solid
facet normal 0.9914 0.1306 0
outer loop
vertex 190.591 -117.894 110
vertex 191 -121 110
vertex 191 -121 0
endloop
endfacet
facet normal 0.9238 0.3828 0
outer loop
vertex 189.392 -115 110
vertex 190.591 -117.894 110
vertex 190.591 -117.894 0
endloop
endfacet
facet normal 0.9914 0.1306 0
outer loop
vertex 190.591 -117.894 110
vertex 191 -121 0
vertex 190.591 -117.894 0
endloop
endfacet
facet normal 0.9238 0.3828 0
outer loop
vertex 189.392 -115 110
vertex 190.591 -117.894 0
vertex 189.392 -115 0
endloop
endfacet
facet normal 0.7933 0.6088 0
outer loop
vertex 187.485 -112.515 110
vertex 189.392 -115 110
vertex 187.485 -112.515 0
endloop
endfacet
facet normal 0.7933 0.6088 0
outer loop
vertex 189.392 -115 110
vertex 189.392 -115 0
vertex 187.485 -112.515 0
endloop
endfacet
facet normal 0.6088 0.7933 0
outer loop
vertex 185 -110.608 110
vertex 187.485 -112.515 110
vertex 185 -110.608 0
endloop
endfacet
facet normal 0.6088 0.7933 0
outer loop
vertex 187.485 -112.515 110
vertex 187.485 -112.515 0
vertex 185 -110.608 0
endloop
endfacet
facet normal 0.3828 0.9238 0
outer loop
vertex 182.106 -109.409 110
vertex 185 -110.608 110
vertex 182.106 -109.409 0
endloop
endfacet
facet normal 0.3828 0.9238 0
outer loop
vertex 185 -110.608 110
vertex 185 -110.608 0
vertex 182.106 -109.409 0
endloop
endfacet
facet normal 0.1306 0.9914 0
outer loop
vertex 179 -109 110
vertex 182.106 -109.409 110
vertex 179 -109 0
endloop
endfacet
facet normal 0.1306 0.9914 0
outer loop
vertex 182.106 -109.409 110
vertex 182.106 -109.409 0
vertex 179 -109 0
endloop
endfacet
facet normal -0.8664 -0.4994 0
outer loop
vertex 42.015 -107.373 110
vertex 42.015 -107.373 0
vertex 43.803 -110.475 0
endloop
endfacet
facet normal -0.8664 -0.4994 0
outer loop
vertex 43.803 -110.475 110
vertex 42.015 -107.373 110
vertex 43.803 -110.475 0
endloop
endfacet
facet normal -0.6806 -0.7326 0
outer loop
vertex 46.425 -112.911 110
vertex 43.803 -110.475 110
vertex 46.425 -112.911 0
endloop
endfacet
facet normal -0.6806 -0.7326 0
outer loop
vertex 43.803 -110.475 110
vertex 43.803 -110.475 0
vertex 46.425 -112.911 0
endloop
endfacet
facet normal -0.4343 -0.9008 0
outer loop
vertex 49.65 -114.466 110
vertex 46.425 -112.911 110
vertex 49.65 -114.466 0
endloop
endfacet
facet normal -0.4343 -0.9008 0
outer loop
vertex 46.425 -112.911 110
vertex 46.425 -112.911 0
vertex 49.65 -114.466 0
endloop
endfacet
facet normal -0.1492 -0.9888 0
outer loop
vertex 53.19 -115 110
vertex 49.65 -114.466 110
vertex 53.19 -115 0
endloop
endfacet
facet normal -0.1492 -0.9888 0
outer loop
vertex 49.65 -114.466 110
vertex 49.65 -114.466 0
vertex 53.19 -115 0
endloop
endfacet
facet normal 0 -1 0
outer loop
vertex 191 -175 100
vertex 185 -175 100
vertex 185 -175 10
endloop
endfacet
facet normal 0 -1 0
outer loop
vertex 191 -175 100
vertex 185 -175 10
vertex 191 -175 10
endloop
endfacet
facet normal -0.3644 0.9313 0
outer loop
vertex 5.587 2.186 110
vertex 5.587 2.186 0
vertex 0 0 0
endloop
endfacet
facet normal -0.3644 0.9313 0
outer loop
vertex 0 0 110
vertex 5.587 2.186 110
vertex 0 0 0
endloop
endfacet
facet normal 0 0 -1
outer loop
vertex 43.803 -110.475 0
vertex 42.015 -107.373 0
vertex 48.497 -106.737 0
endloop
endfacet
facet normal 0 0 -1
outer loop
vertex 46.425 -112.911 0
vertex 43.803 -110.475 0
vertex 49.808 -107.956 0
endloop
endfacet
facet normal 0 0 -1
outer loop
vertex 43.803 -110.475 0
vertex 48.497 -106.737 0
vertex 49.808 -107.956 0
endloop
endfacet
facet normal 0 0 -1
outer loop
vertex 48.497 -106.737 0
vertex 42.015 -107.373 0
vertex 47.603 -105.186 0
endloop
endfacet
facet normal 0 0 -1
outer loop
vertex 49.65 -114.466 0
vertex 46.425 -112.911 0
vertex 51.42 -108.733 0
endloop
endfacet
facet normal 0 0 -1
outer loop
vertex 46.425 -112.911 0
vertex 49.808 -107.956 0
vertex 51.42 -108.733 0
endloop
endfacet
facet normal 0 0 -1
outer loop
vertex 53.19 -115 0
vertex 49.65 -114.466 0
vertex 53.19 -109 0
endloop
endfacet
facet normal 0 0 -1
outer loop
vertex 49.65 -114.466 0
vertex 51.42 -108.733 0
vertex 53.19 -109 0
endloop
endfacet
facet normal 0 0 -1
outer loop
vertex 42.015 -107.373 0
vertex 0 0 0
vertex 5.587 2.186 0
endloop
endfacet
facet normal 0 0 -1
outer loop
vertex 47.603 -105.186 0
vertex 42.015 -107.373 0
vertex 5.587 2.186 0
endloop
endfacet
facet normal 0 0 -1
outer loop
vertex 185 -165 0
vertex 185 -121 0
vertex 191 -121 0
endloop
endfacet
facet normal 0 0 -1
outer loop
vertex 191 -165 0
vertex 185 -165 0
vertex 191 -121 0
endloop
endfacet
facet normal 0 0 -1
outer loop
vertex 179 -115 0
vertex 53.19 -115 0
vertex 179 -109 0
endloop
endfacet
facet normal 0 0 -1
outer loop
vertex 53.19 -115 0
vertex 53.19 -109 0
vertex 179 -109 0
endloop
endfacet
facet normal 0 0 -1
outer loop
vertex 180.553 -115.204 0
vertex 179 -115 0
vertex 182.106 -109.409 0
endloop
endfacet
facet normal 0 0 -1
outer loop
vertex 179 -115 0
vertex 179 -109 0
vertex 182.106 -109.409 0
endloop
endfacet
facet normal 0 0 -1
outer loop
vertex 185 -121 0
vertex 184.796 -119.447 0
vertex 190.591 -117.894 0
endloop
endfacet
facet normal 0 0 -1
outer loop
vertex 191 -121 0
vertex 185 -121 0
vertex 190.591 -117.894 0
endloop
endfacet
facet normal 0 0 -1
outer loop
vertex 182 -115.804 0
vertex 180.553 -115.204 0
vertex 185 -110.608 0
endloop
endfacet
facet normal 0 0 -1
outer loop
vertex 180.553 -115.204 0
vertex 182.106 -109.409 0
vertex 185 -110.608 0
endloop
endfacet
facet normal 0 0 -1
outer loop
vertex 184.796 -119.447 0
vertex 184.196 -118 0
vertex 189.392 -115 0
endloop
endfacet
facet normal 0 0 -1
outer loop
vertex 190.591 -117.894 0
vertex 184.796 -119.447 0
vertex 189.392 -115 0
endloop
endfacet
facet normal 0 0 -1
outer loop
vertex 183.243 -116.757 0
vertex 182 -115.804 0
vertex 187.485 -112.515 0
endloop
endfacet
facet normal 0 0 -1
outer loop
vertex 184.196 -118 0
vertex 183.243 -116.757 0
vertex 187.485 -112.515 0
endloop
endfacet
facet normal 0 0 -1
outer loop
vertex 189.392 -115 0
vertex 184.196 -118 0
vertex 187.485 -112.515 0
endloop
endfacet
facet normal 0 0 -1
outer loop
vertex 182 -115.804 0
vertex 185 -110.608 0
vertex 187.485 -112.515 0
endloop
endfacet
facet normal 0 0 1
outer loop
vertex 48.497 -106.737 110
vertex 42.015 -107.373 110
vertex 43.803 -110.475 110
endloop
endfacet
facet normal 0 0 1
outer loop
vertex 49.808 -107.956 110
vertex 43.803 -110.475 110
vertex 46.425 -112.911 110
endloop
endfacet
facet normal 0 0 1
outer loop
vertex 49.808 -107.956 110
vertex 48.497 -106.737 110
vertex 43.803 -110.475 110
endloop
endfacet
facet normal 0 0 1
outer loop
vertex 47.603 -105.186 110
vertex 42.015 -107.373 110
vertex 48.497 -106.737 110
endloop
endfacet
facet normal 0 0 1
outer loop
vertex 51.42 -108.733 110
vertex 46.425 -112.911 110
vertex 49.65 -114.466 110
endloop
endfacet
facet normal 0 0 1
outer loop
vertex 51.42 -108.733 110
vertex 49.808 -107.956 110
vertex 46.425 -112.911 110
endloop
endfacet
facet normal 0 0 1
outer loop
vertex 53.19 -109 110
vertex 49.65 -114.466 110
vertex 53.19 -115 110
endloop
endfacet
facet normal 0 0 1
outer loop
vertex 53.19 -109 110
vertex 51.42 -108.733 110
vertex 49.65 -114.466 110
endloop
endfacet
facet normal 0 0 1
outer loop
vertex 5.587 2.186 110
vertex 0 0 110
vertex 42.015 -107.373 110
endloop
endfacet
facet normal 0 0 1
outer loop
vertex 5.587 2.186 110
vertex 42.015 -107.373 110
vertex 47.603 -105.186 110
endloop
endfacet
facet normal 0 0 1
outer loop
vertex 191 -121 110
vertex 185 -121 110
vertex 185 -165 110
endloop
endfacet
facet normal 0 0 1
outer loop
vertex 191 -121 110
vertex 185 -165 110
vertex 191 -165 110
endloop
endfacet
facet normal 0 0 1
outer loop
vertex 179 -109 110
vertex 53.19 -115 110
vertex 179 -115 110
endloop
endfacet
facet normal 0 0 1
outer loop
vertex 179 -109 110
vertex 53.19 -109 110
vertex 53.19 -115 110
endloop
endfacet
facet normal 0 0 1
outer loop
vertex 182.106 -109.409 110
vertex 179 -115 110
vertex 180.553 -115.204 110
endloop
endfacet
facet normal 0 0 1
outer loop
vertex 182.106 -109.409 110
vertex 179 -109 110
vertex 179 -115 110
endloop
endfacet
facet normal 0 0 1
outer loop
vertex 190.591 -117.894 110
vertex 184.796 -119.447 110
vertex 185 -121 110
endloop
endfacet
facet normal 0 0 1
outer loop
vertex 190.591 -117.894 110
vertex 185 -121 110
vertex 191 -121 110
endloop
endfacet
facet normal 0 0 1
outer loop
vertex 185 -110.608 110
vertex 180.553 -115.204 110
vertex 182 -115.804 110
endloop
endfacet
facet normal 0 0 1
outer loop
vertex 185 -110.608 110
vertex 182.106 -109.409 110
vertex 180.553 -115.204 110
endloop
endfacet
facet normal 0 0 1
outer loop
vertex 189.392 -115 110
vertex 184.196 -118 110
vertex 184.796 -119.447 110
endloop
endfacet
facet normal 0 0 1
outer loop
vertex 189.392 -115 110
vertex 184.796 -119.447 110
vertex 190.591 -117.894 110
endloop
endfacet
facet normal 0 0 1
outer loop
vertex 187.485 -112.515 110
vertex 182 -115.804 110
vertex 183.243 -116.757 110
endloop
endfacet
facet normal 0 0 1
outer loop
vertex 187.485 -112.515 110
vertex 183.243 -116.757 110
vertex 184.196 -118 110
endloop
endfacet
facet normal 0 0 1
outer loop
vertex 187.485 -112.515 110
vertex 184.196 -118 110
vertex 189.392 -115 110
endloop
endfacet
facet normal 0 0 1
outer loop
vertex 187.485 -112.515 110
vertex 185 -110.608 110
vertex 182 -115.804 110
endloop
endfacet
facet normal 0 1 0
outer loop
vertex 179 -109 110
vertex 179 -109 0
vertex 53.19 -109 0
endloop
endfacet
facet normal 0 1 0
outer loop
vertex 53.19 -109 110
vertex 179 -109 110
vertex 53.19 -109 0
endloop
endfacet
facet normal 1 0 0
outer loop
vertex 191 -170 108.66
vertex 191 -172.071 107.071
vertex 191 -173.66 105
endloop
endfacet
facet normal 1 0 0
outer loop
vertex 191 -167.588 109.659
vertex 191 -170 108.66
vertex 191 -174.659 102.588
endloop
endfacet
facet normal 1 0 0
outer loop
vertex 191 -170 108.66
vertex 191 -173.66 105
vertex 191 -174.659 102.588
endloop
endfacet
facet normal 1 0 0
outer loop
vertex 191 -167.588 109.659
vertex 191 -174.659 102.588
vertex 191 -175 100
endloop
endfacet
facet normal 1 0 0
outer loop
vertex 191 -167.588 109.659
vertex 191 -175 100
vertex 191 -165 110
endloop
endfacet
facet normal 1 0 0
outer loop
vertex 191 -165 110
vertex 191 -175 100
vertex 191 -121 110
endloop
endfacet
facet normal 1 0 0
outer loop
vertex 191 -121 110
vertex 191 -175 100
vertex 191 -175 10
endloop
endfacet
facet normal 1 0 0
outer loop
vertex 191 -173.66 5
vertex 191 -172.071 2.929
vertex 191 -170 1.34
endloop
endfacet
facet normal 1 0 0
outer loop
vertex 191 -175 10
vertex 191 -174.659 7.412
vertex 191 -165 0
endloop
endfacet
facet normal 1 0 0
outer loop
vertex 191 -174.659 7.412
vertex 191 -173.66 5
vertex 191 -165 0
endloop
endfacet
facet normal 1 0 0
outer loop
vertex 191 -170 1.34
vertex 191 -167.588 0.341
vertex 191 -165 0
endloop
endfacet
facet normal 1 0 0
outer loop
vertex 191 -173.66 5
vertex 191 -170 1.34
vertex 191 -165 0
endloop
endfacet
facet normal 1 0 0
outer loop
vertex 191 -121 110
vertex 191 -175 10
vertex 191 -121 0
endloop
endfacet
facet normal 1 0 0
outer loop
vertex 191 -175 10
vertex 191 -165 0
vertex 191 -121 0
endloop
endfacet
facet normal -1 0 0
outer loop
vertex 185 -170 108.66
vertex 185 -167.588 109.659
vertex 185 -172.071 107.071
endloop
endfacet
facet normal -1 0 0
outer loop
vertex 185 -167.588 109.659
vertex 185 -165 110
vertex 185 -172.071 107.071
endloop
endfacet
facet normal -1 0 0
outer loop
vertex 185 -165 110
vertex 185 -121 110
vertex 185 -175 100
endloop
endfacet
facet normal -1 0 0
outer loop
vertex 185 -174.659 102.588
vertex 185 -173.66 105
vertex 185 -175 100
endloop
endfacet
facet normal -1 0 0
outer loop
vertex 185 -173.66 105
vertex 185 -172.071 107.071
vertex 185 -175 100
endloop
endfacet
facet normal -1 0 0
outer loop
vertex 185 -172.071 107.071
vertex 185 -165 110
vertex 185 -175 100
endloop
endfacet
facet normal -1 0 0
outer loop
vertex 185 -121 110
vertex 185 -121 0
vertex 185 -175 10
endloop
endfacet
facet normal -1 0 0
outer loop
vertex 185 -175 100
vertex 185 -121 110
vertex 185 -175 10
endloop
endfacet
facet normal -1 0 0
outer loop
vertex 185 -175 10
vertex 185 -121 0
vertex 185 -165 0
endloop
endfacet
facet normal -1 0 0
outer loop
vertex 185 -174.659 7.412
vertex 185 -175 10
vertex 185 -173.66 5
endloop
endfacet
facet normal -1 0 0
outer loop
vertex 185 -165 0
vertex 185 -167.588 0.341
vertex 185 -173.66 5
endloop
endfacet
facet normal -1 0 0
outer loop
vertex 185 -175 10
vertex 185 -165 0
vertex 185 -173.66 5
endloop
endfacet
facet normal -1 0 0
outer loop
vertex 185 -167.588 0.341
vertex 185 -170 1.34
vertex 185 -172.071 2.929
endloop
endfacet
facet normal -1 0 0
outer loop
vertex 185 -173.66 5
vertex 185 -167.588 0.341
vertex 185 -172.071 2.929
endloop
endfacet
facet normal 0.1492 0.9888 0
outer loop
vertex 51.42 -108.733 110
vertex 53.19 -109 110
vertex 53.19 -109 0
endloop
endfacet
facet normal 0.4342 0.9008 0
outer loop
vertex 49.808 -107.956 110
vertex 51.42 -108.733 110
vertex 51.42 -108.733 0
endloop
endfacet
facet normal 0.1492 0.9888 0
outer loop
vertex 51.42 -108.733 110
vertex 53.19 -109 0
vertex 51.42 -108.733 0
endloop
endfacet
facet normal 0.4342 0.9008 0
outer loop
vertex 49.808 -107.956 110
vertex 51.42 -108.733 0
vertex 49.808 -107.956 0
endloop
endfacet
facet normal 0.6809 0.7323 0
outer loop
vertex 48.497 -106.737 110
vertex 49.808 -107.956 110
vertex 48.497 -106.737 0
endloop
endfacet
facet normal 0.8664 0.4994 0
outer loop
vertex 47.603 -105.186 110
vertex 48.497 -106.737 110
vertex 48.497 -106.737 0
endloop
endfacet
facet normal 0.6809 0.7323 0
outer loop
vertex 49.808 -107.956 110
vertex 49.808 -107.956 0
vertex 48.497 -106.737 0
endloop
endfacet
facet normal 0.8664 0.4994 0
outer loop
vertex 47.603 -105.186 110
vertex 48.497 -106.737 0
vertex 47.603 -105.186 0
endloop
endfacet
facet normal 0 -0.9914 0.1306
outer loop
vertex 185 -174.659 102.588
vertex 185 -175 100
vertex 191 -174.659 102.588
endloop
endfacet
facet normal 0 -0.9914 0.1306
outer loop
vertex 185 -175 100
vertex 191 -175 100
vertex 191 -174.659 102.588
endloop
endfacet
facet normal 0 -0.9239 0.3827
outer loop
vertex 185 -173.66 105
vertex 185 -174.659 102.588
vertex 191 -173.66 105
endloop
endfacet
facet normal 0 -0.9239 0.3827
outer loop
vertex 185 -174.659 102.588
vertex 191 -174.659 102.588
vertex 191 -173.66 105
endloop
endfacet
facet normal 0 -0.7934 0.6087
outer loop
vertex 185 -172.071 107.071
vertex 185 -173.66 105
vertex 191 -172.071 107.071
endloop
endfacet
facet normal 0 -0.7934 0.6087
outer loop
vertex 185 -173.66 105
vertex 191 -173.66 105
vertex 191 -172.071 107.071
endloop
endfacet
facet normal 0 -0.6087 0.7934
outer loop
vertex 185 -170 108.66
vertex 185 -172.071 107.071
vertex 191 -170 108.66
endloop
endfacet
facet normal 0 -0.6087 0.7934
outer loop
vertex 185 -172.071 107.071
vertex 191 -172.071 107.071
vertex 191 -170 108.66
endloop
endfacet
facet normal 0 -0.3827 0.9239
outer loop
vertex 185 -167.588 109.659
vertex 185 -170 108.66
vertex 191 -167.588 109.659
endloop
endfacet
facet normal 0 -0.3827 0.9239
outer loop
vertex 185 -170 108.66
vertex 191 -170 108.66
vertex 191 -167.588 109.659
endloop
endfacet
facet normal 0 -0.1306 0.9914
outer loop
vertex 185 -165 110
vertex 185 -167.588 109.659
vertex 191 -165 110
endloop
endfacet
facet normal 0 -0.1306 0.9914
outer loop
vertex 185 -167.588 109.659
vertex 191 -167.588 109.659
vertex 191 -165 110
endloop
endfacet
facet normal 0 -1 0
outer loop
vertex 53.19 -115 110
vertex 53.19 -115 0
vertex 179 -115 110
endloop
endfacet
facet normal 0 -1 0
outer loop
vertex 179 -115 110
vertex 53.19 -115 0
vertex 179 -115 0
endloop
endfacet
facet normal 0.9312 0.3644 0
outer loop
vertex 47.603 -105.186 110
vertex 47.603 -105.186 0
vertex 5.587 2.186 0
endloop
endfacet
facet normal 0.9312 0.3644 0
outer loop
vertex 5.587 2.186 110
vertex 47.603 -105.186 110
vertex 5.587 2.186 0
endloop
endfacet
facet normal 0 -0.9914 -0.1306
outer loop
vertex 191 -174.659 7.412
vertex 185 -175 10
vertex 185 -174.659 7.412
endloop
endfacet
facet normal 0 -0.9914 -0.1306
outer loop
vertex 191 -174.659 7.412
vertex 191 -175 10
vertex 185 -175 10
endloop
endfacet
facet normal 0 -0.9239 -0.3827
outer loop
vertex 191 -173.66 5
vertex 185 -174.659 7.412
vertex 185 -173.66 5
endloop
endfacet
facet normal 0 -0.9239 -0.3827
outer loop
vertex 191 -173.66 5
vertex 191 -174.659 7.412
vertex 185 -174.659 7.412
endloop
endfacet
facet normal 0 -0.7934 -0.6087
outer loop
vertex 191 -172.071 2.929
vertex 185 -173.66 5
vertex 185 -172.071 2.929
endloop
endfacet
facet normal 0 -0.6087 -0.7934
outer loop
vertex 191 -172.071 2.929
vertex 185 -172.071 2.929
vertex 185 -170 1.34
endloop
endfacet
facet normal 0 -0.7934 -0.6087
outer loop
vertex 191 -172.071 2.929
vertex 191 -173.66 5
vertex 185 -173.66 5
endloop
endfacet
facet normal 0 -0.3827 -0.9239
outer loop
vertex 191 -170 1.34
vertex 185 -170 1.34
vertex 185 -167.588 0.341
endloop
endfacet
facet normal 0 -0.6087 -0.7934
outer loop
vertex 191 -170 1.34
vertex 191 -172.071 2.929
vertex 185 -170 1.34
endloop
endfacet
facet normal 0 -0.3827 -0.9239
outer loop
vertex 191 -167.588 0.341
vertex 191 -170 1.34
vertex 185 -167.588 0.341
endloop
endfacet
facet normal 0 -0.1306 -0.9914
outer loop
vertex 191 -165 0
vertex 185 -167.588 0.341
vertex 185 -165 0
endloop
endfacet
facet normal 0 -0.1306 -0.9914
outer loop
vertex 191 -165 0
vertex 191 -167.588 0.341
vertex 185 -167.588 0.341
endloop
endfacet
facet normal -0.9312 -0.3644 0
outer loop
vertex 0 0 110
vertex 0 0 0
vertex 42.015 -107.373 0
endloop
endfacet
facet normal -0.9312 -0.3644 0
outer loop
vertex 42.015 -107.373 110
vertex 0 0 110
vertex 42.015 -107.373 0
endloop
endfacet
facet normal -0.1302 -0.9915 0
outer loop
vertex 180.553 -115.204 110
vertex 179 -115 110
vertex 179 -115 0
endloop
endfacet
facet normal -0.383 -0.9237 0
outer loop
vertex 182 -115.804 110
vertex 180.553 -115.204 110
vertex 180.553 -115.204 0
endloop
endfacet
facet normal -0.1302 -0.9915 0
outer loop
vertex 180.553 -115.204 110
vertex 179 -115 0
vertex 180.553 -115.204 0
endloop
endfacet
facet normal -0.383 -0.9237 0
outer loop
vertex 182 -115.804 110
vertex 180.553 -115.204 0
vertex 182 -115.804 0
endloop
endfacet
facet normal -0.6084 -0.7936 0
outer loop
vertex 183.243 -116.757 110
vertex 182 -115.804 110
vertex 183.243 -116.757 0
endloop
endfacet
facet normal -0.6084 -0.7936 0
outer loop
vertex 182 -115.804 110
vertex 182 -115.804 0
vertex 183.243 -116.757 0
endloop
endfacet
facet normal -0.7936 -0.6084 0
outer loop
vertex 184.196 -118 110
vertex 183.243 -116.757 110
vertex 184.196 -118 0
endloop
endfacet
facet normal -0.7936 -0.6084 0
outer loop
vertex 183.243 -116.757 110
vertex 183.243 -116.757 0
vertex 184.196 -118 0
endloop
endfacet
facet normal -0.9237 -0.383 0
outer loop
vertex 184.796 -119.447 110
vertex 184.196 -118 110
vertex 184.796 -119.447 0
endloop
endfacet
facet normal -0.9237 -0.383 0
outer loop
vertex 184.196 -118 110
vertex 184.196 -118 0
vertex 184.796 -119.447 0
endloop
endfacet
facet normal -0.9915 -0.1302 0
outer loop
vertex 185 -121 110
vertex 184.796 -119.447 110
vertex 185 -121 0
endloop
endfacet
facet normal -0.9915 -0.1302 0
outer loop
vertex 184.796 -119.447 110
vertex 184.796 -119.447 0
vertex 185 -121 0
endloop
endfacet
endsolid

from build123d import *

# Parameters (mm, degrees)
SM_BASE_FLANGE_1_DEPTH = 110
FILLET_1_R             = 10


# Sheet-metal steps are written as plain solids
with BuildPart() as part:
    # Sketch 1 → 基体-法兰1 (new body)
    with BuildSketch(Plane.XY):
        with BuildLine():
            Line((0, 0), (42.015440419, -107.372792183))
            ThreePointArc((42.015440419, -107.372792183), (46.425499978, -112.91144556), (53.190353776, -115))
            Line((53.190353776, -115), (179, -115))
            ThreePointArc((179, -115), (183.242640687, -116.757359313), (185, -121))
            Line((185, -121), (185, -175))
            Line((185, -175), (191, -175))
            Line((191, -175), (191, -121))
            ThreePointArc((191, -121), (187.485281374, -112.514718626), (179, -109))
            Line((179, -109), (53.190353776, -109))
            ThreePointArc((53.190353776, -109), (49.807926877, -107.95572278), (47.602897098, -105.186396091))
            Line((47.602897098, -105.186396091), (5.587456678, 2.186396091))
            Line((5.587456678, 2.186396091), (0, 0))
        make_face()
    extrude(amount=SM_BASE_FLANGE_1_DEPTH)

    # 圆角1
    fillet_1_edges = [part.edges().sort_by_distance(p)[0] for p in [
        (188, -175, 0),
        (188, -175, 110),
    ]]
    fillet(fillet_1_edges, radius=FILLET_1_R)


solid = part.part
